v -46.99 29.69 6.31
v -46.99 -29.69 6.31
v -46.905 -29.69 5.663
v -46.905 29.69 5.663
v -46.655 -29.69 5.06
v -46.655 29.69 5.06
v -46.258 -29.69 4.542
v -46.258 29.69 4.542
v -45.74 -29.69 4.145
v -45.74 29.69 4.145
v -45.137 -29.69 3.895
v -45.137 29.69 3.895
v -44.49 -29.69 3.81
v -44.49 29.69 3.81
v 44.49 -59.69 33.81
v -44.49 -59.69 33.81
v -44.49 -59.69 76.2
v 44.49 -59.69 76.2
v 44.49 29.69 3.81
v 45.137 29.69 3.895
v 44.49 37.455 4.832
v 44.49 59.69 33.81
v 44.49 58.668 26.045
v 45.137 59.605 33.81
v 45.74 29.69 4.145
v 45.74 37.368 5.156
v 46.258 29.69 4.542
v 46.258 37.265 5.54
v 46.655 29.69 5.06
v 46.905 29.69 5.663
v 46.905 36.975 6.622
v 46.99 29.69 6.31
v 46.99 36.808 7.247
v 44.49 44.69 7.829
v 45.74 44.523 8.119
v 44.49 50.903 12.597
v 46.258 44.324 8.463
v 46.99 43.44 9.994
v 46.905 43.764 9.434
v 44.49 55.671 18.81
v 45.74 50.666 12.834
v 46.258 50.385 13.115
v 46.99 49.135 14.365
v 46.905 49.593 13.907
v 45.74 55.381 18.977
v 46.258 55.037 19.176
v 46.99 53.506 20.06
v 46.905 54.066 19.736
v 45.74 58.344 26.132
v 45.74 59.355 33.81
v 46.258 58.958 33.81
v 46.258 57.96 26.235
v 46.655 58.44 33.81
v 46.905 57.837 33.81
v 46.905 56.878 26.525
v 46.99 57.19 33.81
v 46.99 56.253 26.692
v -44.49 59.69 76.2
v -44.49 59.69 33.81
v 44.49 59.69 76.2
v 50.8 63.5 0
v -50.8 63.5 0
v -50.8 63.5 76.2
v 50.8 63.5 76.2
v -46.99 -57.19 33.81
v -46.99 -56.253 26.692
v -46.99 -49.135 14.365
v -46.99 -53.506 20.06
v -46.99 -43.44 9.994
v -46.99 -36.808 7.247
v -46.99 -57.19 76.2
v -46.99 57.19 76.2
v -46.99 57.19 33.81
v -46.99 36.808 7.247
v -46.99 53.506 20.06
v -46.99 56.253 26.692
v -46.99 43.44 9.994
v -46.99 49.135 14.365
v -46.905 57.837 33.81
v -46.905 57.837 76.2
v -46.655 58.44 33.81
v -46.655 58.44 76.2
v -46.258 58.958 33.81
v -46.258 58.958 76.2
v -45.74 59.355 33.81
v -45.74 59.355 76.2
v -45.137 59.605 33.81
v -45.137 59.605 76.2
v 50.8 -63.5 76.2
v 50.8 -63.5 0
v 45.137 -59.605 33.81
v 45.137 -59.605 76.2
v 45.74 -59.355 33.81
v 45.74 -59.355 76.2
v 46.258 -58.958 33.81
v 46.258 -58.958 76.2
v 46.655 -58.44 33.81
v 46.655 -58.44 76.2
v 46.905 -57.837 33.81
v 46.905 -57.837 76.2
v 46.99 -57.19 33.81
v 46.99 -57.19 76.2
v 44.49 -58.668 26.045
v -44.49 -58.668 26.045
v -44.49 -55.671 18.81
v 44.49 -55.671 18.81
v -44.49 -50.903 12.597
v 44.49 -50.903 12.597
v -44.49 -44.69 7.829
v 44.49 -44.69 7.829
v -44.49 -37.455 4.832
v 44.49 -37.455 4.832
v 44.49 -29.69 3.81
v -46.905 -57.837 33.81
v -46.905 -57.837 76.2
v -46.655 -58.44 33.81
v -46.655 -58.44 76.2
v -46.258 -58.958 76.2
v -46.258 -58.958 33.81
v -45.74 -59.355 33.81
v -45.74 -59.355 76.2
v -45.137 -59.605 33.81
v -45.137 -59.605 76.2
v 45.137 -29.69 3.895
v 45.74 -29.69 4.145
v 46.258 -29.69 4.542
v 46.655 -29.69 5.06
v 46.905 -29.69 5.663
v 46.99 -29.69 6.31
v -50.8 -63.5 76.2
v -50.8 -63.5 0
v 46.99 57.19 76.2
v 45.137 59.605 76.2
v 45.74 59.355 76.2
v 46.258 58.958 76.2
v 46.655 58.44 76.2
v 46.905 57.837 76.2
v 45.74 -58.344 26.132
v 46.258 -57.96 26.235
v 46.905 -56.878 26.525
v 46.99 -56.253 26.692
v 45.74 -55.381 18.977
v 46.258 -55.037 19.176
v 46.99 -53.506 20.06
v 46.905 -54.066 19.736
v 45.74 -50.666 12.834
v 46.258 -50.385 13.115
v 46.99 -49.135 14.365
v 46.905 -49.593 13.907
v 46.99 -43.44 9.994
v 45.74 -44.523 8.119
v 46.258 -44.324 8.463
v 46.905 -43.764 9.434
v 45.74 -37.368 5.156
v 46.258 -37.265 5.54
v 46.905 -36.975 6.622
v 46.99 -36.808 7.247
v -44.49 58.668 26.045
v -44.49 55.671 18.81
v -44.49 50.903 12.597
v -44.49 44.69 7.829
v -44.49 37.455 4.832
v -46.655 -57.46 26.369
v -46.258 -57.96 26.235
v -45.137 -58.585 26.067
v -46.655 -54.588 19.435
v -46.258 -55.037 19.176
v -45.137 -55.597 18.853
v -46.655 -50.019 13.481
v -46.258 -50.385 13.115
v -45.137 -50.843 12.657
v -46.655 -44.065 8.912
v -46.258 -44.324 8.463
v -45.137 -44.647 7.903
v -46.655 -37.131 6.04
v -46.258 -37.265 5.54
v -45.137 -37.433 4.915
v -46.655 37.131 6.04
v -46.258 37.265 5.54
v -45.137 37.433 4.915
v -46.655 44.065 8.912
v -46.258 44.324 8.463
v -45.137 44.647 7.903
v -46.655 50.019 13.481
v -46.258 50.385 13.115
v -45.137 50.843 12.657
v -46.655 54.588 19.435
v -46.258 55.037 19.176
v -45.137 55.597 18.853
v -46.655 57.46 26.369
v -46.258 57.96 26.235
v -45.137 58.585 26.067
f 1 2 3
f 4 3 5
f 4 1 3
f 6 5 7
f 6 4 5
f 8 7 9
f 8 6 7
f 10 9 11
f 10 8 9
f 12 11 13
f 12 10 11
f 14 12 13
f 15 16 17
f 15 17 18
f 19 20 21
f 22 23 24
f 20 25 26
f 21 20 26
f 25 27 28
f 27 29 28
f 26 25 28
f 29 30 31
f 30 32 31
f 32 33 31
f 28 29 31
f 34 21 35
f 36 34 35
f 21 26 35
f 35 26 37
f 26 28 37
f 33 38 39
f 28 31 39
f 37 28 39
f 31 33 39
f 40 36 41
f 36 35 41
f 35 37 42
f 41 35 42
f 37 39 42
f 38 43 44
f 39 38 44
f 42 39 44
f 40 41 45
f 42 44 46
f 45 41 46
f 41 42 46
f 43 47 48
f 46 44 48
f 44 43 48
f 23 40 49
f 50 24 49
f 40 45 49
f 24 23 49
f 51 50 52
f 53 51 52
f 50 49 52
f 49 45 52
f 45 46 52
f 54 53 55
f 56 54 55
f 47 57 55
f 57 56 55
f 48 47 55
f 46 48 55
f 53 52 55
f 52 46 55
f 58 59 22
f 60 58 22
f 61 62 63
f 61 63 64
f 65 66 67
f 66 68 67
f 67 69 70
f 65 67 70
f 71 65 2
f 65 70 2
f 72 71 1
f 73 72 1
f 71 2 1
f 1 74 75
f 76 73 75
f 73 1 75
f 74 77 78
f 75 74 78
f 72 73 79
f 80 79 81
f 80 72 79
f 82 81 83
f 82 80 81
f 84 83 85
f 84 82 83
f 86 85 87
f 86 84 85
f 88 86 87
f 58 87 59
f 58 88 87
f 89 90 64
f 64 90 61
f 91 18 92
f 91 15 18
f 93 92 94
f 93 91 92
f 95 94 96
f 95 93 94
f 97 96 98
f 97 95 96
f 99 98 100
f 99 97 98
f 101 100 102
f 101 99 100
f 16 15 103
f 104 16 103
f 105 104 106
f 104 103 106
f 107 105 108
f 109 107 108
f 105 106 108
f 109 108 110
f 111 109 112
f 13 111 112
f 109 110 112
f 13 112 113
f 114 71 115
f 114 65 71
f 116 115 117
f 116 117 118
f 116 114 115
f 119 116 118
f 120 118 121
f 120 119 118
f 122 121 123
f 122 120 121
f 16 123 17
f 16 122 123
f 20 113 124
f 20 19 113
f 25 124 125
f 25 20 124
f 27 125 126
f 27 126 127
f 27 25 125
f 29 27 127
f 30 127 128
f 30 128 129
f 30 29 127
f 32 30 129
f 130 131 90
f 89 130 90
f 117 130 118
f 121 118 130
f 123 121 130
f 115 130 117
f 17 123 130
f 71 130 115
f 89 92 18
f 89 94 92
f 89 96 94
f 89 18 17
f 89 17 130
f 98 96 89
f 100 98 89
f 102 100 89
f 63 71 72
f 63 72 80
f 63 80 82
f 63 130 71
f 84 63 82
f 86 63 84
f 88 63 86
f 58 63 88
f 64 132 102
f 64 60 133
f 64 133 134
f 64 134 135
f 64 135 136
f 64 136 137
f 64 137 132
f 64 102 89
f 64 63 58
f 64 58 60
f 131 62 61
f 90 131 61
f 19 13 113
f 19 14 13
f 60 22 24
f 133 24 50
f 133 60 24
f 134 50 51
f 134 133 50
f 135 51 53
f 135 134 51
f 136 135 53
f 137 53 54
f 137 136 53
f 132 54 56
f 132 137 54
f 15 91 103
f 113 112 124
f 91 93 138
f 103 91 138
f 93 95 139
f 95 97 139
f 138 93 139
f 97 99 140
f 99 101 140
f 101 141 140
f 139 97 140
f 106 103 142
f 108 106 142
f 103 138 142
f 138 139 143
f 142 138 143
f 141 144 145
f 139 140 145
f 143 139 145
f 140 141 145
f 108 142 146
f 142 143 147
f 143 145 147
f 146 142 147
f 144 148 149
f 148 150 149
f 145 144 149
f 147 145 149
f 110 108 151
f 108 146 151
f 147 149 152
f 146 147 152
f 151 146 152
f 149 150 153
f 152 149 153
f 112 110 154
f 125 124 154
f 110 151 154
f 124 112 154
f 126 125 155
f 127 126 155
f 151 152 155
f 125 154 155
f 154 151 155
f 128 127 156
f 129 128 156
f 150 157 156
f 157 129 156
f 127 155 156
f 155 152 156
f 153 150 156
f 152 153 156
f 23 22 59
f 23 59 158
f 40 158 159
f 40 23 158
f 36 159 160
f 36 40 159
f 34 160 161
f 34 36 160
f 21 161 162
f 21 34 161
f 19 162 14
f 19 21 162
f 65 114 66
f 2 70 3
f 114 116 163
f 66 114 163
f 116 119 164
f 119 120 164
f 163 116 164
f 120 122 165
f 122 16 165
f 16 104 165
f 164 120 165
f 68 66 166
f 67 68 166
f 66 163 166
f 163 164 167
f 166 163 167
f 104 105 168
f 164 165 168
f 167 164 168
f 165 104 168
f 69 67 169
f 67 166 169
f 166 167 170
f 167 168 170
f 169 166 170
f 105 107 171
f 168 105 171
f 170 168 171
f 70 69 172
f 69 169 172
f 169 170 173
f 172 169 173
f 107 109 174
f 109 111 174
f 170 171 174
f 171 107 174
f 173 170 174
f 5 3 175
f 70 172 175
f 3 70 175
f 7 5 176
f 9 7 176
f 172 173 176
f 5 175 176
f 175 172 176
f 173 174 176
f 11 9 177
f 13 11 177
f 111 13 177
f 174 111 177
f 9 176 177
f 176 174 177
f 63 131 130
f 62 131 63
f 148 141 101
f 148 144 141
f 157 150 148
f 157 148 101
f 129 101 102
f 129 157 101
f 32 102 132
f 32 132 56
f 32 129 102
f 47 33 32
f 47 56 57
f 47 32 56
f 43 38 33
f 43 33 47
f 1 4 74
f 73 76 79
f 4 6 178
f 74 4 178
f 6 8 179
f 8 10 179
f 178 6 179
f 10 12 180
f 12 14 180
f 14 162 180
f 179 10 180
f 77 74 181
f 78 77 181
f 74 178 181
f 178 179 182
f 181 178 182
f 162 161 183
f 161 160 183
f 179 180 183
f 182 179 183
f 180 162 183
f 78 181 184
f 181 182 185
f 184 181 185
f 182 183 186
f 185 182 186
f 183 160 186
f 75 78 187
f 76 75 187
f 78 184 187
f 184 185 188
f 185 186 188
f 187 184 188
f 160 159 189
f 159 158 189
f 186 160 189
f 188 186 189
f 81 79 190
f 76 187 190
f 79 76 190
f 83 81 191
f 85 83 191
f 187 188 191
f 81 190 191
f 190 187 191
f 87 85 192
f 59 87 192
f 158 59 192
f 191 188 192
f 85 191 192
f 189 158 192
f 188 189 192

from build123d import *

# Parameters (mm, degrees)
F0_W     = 101.6
F0_H     = 127
F1_DEPTH = 76.2
F2_T     = -3.81
F3_R     = 30
F4_R     = 2.5
F5_DEPTH = 76.2


with BuildPart() as f1:
    # F0 (on Top) → F1 (new body)
    with BuildSketch(Plane.XY):
        Rectangle(F0_W, F0_H)
    extrude(amount=F1_DEPTH)

    # F2
    f2_openings = [f1.faces().sort_by_distance(p)[0] for p in [
        (0, 0, 76.2),
    ]]
    offset(amount=F2_T, openings=f2_openings)

    # F3
    f3_edges = [f1.edges().sort_by_distance(p)[0] for p in [
        (0, 59.69, 3.81),
        (0, -59.69, 3.81),
    ]]
    fillet(f3_edges, radius=F3_R)

    # F4
    f4_edges = [f1.edges().sort_by_distance(p)[0] for p in [
        (-46.99, -50.903203, 12.596797),
        (46.99, -50.903203, 12.596797),
    ]]
    fillet(f4_edges, radius=F4_R)

    # F5 (add): a face of the model
    f5_faces = [f1.faces().sort_by_distance(p)[0] for p in [
        (0, -61.3163935563, 76.2),
    ]]
    extrude(f5_faces, amount=-F5_DEPTH)


solid = f1.part
